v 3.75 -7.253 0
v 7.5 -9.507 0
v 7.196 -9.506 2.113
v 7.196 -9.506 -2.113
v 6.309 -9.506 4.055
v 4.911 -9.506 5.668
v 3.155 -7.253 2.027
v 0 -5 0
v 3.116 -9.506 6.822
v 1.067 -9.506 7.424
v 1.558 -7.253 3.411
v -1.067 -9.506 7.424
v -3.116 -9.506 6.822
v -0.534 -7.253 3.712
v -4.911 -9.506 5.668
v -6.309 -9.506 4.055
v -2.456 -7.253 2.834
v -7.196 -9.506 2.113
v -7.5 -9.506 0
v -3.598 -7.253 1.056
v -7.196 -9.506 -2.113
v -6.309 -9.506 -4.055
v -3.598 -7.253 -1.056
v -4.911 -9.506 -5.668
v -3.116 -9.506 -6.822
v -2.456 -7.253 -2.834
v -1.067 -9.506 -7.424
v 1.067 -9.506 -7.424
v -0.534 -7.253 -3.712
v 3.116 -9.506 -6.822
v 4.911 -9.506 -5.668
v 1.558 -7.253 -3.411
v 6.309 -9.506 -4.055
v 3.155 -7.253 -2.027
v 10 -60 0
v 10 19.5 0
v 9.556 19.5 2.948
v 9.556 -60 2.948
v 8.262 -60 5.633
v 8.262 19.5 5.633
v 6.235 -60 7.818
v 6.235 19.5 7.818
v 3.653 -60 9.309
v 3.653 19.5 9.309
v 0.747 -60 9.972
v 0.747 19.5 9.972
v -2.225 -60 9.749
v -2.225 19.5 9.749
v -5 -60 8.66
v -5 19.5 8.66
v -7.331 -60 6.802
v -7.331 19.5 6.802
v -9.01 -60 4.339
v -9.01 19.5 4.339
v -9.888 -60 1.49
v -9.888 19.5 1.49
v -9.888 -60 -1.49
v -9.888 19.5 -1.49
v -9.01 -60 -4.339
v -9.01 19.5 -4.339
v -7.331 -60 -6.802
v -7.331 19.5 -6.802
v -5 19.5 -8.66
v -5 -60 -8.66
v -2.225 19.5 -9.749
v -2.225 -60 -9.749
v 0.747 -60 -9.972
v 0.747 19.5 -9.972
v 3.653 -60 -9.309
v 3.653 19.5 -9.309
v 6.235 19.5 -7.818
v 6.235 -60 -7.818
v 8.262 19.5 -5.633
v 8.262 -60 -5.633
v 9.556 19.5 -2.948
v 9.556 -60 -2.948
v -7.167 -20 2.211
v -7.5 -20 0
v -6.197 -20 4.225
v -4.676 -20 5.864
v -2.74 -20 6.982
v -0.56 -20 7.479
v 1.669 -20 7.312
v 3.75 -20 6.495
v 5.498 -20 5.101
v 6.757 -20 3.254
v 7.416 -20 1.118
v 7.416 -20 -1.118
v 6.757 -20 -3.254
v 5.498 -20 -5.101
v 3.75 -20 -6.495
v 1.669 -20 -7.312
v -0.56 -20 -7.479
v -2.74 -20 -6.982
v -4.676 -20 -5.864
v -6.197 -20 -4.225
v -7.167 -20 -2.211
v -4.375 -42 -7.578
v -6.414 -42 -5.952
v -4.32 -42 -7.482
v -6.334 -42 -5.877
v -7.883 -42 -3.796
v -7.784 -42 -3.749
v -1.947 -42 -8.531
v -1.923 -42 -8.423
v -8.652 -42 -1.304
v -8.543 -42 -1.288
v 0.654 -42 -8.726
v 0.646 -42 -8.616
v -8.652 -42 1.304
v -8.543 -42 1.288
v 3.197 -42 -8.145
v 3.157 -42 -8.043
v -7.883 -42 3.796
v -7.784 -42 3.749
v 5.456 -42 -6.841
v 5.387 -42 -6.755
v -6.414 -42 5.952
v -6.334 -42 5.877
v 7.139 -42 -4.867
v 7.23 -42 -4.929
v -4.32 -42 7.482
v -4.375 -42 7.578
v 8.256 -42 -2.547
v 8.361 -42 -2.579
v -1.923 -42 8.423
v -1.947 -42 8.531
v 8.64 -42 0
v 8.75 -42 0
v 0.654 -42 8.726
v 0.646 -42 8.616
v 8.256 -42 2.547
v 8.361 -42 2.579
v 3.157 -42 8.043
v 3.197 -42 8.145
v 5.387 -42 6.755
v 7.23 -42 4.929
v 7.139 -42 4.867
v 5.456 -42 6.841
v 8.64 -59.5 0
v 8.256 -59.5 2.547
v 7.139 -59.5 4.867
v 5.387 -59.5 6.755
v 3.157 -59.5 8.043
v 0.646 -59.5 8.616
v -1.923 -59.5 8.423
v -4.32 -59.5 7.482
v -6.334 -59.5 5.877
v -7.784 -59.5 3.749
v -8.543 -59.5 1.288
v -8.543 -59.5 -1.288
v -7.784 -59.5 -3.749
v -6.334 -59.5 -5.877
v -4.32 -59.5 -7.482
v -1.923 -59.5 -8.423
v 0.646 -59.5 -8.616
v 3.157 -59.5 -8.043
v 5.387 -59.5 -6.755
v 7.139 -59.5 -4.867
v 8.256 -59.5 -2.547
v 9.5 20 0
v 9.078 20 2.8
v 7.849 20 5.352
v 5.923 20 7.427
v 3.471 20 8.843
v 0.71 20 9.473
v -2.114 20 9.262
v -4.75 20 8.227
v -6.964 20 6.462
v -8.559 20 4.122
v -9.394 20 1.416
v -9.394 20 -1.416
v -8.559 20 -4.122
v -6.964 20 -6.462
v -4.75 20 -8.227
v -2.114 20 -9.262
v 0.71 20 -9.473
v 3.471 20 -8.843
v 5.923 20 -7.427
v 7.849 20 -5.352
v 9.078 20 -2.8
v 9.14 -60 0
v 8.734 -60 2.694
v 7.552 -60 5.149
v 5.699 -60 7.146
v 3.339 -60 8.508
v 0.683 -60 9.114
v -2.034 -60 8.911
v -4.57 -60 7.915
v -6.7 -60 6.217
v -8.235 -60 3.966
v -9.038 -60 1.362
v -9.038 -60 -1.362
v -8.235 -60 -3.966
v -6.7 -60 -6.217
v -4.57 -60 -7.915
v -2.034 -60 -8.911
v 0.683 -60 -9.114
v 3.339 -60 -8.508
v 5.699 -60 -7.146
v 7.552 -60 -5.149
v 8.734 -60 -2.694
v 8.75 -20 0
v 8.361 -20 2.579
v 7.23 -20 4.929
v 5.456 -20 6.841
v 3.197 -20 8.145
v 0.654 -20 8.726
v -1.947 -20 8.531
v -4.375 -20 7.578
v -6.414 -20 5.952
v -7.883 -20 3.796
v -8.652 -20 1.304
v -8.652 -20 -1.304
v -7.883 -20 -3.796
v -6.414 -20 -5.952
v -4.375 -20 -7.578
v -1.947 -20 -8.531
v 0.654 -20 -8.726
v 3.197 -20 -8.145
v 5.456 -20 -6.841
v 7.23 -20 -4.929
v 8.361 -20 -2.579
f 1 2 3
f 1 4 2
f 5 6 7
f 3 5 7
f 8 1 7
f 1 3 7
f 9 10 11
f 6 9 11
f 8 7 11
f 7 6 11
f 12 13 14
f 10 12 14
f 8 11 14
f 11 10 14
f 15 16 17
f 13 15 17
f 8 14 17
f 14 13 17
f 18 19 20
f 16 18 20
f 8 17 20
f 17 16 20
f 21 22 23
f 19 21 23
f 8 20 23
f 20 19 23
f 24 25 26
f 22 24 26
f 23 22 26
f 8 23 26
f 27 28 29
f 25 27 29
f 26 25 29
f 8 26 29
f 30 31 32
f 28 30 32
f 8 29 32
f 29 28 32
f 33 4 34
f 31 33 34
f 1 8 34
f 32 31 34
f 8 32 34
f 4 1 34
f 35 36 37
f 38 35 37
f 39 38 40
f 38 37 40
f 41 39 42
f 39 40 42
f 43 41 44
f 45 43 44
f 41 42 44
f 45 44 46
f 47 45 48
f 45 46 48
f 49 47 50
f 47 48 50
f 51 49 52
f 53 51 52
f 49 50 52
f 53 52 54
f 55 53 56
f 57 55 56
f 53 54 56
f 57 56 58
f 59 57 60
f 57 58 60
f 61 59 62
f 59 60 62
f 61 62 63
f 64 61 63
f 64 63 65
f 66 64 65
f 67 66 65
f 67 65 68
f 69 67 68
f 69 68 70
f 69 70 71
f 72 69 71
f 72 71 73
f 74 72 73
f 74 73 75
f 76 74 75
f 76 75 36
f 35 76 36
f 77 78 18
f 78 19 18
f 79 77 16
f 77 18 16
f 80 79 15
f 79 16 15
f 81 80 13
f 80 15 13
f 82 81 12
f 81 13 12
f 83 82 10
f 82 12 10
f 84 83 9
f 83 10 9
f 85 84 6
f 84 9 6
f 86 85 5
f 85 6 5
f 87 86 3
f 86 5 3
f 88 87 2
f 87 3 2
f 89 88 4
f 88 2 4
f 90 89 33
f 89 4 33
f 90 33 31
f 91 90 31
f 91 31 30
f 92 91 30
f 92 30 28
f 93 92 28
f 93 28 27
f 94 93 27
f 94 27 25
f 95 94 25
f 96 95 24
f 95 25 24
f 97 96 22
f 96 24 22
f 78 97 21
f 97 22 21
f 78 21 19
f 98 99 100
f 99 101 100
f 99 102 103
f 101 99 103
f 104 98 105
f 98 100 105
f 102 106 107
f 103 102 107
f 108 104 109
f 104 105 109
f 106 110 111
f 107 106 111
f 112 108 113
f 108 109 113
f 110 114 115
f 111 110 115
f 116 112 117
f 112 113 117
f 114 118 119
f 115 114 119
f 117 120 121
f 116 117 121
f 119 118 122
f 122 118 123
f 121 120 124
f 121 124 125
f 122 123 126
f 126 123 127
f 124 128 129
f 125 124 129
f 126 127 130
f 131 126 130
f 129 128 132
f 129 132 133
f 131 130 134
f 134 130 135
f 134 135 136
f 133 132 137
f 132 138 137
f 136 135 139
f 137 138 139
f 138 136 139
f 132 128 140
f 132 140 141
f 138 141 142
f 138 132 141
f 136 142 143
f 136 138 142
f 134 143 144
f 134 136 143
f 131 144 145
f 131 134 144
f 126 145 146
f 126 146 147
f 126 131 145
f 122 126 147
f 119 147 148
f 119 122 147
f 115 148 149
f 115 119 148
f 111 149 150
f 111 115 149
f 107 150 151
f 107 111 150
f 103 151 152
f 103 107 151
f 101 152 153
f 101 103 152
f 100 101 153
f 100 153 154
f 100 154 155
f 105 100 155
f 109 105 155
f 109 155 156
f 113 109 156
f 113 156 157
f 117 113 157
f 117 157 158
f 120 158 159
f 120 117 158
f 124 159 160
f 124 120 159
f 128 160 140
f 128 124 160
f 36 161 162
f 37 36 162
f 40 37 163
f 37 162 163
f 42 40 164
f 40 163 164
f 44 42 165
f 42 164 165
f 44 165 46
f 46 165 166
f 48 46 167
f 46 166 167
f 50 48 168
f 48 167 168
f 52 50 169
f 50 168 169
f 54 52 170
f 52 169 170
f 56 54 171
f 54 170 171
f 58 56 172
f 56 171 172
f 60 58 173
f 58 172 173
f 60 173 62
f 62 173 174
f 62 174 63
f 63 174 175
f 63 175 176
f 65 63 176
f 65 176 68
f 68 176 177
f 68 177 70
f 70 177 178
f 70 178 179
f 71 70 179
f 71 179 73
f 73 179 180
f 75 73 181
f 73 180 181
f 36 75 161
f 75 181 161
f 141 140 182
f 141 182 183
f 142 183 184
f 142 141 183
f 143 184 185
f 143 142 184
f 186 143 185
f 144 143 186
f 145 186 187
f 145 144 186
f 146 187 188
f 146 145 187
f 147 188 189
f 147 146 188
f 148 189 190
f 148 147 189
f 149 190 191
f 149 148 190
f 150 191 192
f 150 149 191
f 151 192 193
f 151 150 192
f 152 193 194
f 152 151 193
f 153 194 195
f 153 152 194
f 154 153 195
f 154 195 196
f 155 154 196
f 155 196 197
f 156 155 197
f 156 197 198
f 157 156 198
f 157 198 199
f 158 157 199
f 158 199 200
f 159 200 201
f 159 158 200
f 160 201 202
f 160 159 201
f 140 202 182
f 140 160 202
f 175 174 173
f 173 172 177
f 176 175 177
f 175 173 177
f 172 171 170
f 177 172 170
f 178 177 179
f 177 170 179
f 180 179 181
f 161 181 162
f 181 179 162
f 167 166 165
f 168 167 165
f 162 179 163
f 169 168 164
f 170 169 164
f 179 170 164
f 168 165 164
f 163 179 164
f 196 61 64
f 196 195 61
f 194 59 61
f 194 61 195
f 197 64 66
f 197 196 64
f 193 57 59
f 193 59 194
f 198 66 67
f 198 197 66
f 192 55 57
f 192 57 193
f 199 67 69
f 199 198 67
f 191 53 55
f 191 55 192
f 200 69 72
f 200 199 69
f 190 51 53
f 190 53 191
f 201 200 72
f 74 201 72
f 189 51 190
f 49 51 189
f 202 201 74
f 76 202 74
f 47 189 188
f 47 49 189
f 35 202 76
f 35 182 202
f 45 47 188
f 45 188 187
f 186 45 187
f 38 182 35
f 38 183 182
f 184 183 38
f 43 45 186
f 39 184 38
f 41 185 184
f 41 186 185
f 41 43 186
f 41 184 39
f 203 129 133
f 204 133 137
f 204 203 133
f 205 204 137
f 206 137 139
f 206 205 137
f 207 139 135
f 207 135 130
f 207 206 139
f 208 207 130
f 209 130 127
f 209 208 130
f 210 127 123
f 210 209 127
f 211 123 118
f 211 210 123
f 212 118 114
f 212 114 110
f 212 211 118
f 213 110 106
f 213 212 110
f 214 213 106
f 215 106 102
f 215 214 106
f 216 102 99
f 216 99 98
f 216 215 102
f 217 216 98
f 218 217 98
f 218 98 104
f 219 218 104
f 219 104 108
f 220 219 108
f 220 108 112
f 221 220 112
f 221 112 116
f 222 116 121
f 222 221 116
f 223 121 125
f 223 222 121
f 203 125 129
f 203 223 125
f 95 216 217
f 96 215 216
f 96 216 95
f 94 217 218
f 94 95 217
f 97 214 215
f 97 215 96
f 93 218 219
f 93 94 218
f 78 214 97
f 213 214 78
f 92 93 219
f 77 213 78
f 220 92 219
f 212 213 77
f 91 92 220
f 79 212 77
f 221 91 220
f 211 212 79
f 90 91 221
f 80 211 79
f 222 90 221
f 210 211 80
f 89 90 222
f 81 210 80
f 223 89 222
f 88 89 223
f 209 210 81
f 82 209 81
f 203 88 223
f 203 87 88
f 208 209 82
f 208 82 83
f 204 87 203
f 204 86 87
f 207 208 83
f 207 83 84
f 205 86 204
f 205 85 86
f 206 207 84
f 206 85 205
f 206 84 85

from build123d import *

# Parameters (mm, degrees)
F0_R     = 10
F1_DEPTH = 20
F3_D     = 15
F3_DEPTH = 10.4935
F3_TIP   = 4.5064546427
F4_R     = 10
F4_R_2   = 8.75
F5_DEPTH = 22
F6_R     = 10
F6_R_2   = 8.64
F7_DEPTH = 18
F8_SIZE  = 0.5


with BuildPart() as f1:
    # F0 (on Front) → F1 (new body, symmetric)
    with BuildSketch(Plane.XZ):
        Circle(F0_R)
    extrude(amount=F1_DEPTH, both=True)

    # F3
    with Locations(Plane.XZ.offset(20)):
        with Locations((0, 0)):
            Hole(F3_D / 2, depth=F3_DEPTH)
            with Locations((0, 0, -(F3_DEPTH + F3_TIP / 2))):  # 118° drill point
                Cone(0, F3_D / 2, F3_TIP, mode=Mode.SUBTRACT)

    # F4 (on face) → F5 (join)
    with BuildSketch(Plane.XZ.offset(20)):
        Circle(F4_R)
        Circle(F4_R_2, mode=Mode.SUBTRACT)
    extrude(amount=F5_DEPTH)

    # F6 (on face) → F7 (join)
    with BuildSketch(Plane.XZ.offset(42)):
        Circle(F6_R)
        Circle(F6_R_2, mode=Mode.SUBTRACT)
    extrude(amount=F7_DEPTH)

    # F8
    f8_edges = [f1.edges().sort_by_distance(p)[0] for p in [
        (-8.64, -60, 0),
        (-10, 20, 0),
    ]]
    chamfer(f8_edges, length=F8_SIZE)


solid = f1.part
